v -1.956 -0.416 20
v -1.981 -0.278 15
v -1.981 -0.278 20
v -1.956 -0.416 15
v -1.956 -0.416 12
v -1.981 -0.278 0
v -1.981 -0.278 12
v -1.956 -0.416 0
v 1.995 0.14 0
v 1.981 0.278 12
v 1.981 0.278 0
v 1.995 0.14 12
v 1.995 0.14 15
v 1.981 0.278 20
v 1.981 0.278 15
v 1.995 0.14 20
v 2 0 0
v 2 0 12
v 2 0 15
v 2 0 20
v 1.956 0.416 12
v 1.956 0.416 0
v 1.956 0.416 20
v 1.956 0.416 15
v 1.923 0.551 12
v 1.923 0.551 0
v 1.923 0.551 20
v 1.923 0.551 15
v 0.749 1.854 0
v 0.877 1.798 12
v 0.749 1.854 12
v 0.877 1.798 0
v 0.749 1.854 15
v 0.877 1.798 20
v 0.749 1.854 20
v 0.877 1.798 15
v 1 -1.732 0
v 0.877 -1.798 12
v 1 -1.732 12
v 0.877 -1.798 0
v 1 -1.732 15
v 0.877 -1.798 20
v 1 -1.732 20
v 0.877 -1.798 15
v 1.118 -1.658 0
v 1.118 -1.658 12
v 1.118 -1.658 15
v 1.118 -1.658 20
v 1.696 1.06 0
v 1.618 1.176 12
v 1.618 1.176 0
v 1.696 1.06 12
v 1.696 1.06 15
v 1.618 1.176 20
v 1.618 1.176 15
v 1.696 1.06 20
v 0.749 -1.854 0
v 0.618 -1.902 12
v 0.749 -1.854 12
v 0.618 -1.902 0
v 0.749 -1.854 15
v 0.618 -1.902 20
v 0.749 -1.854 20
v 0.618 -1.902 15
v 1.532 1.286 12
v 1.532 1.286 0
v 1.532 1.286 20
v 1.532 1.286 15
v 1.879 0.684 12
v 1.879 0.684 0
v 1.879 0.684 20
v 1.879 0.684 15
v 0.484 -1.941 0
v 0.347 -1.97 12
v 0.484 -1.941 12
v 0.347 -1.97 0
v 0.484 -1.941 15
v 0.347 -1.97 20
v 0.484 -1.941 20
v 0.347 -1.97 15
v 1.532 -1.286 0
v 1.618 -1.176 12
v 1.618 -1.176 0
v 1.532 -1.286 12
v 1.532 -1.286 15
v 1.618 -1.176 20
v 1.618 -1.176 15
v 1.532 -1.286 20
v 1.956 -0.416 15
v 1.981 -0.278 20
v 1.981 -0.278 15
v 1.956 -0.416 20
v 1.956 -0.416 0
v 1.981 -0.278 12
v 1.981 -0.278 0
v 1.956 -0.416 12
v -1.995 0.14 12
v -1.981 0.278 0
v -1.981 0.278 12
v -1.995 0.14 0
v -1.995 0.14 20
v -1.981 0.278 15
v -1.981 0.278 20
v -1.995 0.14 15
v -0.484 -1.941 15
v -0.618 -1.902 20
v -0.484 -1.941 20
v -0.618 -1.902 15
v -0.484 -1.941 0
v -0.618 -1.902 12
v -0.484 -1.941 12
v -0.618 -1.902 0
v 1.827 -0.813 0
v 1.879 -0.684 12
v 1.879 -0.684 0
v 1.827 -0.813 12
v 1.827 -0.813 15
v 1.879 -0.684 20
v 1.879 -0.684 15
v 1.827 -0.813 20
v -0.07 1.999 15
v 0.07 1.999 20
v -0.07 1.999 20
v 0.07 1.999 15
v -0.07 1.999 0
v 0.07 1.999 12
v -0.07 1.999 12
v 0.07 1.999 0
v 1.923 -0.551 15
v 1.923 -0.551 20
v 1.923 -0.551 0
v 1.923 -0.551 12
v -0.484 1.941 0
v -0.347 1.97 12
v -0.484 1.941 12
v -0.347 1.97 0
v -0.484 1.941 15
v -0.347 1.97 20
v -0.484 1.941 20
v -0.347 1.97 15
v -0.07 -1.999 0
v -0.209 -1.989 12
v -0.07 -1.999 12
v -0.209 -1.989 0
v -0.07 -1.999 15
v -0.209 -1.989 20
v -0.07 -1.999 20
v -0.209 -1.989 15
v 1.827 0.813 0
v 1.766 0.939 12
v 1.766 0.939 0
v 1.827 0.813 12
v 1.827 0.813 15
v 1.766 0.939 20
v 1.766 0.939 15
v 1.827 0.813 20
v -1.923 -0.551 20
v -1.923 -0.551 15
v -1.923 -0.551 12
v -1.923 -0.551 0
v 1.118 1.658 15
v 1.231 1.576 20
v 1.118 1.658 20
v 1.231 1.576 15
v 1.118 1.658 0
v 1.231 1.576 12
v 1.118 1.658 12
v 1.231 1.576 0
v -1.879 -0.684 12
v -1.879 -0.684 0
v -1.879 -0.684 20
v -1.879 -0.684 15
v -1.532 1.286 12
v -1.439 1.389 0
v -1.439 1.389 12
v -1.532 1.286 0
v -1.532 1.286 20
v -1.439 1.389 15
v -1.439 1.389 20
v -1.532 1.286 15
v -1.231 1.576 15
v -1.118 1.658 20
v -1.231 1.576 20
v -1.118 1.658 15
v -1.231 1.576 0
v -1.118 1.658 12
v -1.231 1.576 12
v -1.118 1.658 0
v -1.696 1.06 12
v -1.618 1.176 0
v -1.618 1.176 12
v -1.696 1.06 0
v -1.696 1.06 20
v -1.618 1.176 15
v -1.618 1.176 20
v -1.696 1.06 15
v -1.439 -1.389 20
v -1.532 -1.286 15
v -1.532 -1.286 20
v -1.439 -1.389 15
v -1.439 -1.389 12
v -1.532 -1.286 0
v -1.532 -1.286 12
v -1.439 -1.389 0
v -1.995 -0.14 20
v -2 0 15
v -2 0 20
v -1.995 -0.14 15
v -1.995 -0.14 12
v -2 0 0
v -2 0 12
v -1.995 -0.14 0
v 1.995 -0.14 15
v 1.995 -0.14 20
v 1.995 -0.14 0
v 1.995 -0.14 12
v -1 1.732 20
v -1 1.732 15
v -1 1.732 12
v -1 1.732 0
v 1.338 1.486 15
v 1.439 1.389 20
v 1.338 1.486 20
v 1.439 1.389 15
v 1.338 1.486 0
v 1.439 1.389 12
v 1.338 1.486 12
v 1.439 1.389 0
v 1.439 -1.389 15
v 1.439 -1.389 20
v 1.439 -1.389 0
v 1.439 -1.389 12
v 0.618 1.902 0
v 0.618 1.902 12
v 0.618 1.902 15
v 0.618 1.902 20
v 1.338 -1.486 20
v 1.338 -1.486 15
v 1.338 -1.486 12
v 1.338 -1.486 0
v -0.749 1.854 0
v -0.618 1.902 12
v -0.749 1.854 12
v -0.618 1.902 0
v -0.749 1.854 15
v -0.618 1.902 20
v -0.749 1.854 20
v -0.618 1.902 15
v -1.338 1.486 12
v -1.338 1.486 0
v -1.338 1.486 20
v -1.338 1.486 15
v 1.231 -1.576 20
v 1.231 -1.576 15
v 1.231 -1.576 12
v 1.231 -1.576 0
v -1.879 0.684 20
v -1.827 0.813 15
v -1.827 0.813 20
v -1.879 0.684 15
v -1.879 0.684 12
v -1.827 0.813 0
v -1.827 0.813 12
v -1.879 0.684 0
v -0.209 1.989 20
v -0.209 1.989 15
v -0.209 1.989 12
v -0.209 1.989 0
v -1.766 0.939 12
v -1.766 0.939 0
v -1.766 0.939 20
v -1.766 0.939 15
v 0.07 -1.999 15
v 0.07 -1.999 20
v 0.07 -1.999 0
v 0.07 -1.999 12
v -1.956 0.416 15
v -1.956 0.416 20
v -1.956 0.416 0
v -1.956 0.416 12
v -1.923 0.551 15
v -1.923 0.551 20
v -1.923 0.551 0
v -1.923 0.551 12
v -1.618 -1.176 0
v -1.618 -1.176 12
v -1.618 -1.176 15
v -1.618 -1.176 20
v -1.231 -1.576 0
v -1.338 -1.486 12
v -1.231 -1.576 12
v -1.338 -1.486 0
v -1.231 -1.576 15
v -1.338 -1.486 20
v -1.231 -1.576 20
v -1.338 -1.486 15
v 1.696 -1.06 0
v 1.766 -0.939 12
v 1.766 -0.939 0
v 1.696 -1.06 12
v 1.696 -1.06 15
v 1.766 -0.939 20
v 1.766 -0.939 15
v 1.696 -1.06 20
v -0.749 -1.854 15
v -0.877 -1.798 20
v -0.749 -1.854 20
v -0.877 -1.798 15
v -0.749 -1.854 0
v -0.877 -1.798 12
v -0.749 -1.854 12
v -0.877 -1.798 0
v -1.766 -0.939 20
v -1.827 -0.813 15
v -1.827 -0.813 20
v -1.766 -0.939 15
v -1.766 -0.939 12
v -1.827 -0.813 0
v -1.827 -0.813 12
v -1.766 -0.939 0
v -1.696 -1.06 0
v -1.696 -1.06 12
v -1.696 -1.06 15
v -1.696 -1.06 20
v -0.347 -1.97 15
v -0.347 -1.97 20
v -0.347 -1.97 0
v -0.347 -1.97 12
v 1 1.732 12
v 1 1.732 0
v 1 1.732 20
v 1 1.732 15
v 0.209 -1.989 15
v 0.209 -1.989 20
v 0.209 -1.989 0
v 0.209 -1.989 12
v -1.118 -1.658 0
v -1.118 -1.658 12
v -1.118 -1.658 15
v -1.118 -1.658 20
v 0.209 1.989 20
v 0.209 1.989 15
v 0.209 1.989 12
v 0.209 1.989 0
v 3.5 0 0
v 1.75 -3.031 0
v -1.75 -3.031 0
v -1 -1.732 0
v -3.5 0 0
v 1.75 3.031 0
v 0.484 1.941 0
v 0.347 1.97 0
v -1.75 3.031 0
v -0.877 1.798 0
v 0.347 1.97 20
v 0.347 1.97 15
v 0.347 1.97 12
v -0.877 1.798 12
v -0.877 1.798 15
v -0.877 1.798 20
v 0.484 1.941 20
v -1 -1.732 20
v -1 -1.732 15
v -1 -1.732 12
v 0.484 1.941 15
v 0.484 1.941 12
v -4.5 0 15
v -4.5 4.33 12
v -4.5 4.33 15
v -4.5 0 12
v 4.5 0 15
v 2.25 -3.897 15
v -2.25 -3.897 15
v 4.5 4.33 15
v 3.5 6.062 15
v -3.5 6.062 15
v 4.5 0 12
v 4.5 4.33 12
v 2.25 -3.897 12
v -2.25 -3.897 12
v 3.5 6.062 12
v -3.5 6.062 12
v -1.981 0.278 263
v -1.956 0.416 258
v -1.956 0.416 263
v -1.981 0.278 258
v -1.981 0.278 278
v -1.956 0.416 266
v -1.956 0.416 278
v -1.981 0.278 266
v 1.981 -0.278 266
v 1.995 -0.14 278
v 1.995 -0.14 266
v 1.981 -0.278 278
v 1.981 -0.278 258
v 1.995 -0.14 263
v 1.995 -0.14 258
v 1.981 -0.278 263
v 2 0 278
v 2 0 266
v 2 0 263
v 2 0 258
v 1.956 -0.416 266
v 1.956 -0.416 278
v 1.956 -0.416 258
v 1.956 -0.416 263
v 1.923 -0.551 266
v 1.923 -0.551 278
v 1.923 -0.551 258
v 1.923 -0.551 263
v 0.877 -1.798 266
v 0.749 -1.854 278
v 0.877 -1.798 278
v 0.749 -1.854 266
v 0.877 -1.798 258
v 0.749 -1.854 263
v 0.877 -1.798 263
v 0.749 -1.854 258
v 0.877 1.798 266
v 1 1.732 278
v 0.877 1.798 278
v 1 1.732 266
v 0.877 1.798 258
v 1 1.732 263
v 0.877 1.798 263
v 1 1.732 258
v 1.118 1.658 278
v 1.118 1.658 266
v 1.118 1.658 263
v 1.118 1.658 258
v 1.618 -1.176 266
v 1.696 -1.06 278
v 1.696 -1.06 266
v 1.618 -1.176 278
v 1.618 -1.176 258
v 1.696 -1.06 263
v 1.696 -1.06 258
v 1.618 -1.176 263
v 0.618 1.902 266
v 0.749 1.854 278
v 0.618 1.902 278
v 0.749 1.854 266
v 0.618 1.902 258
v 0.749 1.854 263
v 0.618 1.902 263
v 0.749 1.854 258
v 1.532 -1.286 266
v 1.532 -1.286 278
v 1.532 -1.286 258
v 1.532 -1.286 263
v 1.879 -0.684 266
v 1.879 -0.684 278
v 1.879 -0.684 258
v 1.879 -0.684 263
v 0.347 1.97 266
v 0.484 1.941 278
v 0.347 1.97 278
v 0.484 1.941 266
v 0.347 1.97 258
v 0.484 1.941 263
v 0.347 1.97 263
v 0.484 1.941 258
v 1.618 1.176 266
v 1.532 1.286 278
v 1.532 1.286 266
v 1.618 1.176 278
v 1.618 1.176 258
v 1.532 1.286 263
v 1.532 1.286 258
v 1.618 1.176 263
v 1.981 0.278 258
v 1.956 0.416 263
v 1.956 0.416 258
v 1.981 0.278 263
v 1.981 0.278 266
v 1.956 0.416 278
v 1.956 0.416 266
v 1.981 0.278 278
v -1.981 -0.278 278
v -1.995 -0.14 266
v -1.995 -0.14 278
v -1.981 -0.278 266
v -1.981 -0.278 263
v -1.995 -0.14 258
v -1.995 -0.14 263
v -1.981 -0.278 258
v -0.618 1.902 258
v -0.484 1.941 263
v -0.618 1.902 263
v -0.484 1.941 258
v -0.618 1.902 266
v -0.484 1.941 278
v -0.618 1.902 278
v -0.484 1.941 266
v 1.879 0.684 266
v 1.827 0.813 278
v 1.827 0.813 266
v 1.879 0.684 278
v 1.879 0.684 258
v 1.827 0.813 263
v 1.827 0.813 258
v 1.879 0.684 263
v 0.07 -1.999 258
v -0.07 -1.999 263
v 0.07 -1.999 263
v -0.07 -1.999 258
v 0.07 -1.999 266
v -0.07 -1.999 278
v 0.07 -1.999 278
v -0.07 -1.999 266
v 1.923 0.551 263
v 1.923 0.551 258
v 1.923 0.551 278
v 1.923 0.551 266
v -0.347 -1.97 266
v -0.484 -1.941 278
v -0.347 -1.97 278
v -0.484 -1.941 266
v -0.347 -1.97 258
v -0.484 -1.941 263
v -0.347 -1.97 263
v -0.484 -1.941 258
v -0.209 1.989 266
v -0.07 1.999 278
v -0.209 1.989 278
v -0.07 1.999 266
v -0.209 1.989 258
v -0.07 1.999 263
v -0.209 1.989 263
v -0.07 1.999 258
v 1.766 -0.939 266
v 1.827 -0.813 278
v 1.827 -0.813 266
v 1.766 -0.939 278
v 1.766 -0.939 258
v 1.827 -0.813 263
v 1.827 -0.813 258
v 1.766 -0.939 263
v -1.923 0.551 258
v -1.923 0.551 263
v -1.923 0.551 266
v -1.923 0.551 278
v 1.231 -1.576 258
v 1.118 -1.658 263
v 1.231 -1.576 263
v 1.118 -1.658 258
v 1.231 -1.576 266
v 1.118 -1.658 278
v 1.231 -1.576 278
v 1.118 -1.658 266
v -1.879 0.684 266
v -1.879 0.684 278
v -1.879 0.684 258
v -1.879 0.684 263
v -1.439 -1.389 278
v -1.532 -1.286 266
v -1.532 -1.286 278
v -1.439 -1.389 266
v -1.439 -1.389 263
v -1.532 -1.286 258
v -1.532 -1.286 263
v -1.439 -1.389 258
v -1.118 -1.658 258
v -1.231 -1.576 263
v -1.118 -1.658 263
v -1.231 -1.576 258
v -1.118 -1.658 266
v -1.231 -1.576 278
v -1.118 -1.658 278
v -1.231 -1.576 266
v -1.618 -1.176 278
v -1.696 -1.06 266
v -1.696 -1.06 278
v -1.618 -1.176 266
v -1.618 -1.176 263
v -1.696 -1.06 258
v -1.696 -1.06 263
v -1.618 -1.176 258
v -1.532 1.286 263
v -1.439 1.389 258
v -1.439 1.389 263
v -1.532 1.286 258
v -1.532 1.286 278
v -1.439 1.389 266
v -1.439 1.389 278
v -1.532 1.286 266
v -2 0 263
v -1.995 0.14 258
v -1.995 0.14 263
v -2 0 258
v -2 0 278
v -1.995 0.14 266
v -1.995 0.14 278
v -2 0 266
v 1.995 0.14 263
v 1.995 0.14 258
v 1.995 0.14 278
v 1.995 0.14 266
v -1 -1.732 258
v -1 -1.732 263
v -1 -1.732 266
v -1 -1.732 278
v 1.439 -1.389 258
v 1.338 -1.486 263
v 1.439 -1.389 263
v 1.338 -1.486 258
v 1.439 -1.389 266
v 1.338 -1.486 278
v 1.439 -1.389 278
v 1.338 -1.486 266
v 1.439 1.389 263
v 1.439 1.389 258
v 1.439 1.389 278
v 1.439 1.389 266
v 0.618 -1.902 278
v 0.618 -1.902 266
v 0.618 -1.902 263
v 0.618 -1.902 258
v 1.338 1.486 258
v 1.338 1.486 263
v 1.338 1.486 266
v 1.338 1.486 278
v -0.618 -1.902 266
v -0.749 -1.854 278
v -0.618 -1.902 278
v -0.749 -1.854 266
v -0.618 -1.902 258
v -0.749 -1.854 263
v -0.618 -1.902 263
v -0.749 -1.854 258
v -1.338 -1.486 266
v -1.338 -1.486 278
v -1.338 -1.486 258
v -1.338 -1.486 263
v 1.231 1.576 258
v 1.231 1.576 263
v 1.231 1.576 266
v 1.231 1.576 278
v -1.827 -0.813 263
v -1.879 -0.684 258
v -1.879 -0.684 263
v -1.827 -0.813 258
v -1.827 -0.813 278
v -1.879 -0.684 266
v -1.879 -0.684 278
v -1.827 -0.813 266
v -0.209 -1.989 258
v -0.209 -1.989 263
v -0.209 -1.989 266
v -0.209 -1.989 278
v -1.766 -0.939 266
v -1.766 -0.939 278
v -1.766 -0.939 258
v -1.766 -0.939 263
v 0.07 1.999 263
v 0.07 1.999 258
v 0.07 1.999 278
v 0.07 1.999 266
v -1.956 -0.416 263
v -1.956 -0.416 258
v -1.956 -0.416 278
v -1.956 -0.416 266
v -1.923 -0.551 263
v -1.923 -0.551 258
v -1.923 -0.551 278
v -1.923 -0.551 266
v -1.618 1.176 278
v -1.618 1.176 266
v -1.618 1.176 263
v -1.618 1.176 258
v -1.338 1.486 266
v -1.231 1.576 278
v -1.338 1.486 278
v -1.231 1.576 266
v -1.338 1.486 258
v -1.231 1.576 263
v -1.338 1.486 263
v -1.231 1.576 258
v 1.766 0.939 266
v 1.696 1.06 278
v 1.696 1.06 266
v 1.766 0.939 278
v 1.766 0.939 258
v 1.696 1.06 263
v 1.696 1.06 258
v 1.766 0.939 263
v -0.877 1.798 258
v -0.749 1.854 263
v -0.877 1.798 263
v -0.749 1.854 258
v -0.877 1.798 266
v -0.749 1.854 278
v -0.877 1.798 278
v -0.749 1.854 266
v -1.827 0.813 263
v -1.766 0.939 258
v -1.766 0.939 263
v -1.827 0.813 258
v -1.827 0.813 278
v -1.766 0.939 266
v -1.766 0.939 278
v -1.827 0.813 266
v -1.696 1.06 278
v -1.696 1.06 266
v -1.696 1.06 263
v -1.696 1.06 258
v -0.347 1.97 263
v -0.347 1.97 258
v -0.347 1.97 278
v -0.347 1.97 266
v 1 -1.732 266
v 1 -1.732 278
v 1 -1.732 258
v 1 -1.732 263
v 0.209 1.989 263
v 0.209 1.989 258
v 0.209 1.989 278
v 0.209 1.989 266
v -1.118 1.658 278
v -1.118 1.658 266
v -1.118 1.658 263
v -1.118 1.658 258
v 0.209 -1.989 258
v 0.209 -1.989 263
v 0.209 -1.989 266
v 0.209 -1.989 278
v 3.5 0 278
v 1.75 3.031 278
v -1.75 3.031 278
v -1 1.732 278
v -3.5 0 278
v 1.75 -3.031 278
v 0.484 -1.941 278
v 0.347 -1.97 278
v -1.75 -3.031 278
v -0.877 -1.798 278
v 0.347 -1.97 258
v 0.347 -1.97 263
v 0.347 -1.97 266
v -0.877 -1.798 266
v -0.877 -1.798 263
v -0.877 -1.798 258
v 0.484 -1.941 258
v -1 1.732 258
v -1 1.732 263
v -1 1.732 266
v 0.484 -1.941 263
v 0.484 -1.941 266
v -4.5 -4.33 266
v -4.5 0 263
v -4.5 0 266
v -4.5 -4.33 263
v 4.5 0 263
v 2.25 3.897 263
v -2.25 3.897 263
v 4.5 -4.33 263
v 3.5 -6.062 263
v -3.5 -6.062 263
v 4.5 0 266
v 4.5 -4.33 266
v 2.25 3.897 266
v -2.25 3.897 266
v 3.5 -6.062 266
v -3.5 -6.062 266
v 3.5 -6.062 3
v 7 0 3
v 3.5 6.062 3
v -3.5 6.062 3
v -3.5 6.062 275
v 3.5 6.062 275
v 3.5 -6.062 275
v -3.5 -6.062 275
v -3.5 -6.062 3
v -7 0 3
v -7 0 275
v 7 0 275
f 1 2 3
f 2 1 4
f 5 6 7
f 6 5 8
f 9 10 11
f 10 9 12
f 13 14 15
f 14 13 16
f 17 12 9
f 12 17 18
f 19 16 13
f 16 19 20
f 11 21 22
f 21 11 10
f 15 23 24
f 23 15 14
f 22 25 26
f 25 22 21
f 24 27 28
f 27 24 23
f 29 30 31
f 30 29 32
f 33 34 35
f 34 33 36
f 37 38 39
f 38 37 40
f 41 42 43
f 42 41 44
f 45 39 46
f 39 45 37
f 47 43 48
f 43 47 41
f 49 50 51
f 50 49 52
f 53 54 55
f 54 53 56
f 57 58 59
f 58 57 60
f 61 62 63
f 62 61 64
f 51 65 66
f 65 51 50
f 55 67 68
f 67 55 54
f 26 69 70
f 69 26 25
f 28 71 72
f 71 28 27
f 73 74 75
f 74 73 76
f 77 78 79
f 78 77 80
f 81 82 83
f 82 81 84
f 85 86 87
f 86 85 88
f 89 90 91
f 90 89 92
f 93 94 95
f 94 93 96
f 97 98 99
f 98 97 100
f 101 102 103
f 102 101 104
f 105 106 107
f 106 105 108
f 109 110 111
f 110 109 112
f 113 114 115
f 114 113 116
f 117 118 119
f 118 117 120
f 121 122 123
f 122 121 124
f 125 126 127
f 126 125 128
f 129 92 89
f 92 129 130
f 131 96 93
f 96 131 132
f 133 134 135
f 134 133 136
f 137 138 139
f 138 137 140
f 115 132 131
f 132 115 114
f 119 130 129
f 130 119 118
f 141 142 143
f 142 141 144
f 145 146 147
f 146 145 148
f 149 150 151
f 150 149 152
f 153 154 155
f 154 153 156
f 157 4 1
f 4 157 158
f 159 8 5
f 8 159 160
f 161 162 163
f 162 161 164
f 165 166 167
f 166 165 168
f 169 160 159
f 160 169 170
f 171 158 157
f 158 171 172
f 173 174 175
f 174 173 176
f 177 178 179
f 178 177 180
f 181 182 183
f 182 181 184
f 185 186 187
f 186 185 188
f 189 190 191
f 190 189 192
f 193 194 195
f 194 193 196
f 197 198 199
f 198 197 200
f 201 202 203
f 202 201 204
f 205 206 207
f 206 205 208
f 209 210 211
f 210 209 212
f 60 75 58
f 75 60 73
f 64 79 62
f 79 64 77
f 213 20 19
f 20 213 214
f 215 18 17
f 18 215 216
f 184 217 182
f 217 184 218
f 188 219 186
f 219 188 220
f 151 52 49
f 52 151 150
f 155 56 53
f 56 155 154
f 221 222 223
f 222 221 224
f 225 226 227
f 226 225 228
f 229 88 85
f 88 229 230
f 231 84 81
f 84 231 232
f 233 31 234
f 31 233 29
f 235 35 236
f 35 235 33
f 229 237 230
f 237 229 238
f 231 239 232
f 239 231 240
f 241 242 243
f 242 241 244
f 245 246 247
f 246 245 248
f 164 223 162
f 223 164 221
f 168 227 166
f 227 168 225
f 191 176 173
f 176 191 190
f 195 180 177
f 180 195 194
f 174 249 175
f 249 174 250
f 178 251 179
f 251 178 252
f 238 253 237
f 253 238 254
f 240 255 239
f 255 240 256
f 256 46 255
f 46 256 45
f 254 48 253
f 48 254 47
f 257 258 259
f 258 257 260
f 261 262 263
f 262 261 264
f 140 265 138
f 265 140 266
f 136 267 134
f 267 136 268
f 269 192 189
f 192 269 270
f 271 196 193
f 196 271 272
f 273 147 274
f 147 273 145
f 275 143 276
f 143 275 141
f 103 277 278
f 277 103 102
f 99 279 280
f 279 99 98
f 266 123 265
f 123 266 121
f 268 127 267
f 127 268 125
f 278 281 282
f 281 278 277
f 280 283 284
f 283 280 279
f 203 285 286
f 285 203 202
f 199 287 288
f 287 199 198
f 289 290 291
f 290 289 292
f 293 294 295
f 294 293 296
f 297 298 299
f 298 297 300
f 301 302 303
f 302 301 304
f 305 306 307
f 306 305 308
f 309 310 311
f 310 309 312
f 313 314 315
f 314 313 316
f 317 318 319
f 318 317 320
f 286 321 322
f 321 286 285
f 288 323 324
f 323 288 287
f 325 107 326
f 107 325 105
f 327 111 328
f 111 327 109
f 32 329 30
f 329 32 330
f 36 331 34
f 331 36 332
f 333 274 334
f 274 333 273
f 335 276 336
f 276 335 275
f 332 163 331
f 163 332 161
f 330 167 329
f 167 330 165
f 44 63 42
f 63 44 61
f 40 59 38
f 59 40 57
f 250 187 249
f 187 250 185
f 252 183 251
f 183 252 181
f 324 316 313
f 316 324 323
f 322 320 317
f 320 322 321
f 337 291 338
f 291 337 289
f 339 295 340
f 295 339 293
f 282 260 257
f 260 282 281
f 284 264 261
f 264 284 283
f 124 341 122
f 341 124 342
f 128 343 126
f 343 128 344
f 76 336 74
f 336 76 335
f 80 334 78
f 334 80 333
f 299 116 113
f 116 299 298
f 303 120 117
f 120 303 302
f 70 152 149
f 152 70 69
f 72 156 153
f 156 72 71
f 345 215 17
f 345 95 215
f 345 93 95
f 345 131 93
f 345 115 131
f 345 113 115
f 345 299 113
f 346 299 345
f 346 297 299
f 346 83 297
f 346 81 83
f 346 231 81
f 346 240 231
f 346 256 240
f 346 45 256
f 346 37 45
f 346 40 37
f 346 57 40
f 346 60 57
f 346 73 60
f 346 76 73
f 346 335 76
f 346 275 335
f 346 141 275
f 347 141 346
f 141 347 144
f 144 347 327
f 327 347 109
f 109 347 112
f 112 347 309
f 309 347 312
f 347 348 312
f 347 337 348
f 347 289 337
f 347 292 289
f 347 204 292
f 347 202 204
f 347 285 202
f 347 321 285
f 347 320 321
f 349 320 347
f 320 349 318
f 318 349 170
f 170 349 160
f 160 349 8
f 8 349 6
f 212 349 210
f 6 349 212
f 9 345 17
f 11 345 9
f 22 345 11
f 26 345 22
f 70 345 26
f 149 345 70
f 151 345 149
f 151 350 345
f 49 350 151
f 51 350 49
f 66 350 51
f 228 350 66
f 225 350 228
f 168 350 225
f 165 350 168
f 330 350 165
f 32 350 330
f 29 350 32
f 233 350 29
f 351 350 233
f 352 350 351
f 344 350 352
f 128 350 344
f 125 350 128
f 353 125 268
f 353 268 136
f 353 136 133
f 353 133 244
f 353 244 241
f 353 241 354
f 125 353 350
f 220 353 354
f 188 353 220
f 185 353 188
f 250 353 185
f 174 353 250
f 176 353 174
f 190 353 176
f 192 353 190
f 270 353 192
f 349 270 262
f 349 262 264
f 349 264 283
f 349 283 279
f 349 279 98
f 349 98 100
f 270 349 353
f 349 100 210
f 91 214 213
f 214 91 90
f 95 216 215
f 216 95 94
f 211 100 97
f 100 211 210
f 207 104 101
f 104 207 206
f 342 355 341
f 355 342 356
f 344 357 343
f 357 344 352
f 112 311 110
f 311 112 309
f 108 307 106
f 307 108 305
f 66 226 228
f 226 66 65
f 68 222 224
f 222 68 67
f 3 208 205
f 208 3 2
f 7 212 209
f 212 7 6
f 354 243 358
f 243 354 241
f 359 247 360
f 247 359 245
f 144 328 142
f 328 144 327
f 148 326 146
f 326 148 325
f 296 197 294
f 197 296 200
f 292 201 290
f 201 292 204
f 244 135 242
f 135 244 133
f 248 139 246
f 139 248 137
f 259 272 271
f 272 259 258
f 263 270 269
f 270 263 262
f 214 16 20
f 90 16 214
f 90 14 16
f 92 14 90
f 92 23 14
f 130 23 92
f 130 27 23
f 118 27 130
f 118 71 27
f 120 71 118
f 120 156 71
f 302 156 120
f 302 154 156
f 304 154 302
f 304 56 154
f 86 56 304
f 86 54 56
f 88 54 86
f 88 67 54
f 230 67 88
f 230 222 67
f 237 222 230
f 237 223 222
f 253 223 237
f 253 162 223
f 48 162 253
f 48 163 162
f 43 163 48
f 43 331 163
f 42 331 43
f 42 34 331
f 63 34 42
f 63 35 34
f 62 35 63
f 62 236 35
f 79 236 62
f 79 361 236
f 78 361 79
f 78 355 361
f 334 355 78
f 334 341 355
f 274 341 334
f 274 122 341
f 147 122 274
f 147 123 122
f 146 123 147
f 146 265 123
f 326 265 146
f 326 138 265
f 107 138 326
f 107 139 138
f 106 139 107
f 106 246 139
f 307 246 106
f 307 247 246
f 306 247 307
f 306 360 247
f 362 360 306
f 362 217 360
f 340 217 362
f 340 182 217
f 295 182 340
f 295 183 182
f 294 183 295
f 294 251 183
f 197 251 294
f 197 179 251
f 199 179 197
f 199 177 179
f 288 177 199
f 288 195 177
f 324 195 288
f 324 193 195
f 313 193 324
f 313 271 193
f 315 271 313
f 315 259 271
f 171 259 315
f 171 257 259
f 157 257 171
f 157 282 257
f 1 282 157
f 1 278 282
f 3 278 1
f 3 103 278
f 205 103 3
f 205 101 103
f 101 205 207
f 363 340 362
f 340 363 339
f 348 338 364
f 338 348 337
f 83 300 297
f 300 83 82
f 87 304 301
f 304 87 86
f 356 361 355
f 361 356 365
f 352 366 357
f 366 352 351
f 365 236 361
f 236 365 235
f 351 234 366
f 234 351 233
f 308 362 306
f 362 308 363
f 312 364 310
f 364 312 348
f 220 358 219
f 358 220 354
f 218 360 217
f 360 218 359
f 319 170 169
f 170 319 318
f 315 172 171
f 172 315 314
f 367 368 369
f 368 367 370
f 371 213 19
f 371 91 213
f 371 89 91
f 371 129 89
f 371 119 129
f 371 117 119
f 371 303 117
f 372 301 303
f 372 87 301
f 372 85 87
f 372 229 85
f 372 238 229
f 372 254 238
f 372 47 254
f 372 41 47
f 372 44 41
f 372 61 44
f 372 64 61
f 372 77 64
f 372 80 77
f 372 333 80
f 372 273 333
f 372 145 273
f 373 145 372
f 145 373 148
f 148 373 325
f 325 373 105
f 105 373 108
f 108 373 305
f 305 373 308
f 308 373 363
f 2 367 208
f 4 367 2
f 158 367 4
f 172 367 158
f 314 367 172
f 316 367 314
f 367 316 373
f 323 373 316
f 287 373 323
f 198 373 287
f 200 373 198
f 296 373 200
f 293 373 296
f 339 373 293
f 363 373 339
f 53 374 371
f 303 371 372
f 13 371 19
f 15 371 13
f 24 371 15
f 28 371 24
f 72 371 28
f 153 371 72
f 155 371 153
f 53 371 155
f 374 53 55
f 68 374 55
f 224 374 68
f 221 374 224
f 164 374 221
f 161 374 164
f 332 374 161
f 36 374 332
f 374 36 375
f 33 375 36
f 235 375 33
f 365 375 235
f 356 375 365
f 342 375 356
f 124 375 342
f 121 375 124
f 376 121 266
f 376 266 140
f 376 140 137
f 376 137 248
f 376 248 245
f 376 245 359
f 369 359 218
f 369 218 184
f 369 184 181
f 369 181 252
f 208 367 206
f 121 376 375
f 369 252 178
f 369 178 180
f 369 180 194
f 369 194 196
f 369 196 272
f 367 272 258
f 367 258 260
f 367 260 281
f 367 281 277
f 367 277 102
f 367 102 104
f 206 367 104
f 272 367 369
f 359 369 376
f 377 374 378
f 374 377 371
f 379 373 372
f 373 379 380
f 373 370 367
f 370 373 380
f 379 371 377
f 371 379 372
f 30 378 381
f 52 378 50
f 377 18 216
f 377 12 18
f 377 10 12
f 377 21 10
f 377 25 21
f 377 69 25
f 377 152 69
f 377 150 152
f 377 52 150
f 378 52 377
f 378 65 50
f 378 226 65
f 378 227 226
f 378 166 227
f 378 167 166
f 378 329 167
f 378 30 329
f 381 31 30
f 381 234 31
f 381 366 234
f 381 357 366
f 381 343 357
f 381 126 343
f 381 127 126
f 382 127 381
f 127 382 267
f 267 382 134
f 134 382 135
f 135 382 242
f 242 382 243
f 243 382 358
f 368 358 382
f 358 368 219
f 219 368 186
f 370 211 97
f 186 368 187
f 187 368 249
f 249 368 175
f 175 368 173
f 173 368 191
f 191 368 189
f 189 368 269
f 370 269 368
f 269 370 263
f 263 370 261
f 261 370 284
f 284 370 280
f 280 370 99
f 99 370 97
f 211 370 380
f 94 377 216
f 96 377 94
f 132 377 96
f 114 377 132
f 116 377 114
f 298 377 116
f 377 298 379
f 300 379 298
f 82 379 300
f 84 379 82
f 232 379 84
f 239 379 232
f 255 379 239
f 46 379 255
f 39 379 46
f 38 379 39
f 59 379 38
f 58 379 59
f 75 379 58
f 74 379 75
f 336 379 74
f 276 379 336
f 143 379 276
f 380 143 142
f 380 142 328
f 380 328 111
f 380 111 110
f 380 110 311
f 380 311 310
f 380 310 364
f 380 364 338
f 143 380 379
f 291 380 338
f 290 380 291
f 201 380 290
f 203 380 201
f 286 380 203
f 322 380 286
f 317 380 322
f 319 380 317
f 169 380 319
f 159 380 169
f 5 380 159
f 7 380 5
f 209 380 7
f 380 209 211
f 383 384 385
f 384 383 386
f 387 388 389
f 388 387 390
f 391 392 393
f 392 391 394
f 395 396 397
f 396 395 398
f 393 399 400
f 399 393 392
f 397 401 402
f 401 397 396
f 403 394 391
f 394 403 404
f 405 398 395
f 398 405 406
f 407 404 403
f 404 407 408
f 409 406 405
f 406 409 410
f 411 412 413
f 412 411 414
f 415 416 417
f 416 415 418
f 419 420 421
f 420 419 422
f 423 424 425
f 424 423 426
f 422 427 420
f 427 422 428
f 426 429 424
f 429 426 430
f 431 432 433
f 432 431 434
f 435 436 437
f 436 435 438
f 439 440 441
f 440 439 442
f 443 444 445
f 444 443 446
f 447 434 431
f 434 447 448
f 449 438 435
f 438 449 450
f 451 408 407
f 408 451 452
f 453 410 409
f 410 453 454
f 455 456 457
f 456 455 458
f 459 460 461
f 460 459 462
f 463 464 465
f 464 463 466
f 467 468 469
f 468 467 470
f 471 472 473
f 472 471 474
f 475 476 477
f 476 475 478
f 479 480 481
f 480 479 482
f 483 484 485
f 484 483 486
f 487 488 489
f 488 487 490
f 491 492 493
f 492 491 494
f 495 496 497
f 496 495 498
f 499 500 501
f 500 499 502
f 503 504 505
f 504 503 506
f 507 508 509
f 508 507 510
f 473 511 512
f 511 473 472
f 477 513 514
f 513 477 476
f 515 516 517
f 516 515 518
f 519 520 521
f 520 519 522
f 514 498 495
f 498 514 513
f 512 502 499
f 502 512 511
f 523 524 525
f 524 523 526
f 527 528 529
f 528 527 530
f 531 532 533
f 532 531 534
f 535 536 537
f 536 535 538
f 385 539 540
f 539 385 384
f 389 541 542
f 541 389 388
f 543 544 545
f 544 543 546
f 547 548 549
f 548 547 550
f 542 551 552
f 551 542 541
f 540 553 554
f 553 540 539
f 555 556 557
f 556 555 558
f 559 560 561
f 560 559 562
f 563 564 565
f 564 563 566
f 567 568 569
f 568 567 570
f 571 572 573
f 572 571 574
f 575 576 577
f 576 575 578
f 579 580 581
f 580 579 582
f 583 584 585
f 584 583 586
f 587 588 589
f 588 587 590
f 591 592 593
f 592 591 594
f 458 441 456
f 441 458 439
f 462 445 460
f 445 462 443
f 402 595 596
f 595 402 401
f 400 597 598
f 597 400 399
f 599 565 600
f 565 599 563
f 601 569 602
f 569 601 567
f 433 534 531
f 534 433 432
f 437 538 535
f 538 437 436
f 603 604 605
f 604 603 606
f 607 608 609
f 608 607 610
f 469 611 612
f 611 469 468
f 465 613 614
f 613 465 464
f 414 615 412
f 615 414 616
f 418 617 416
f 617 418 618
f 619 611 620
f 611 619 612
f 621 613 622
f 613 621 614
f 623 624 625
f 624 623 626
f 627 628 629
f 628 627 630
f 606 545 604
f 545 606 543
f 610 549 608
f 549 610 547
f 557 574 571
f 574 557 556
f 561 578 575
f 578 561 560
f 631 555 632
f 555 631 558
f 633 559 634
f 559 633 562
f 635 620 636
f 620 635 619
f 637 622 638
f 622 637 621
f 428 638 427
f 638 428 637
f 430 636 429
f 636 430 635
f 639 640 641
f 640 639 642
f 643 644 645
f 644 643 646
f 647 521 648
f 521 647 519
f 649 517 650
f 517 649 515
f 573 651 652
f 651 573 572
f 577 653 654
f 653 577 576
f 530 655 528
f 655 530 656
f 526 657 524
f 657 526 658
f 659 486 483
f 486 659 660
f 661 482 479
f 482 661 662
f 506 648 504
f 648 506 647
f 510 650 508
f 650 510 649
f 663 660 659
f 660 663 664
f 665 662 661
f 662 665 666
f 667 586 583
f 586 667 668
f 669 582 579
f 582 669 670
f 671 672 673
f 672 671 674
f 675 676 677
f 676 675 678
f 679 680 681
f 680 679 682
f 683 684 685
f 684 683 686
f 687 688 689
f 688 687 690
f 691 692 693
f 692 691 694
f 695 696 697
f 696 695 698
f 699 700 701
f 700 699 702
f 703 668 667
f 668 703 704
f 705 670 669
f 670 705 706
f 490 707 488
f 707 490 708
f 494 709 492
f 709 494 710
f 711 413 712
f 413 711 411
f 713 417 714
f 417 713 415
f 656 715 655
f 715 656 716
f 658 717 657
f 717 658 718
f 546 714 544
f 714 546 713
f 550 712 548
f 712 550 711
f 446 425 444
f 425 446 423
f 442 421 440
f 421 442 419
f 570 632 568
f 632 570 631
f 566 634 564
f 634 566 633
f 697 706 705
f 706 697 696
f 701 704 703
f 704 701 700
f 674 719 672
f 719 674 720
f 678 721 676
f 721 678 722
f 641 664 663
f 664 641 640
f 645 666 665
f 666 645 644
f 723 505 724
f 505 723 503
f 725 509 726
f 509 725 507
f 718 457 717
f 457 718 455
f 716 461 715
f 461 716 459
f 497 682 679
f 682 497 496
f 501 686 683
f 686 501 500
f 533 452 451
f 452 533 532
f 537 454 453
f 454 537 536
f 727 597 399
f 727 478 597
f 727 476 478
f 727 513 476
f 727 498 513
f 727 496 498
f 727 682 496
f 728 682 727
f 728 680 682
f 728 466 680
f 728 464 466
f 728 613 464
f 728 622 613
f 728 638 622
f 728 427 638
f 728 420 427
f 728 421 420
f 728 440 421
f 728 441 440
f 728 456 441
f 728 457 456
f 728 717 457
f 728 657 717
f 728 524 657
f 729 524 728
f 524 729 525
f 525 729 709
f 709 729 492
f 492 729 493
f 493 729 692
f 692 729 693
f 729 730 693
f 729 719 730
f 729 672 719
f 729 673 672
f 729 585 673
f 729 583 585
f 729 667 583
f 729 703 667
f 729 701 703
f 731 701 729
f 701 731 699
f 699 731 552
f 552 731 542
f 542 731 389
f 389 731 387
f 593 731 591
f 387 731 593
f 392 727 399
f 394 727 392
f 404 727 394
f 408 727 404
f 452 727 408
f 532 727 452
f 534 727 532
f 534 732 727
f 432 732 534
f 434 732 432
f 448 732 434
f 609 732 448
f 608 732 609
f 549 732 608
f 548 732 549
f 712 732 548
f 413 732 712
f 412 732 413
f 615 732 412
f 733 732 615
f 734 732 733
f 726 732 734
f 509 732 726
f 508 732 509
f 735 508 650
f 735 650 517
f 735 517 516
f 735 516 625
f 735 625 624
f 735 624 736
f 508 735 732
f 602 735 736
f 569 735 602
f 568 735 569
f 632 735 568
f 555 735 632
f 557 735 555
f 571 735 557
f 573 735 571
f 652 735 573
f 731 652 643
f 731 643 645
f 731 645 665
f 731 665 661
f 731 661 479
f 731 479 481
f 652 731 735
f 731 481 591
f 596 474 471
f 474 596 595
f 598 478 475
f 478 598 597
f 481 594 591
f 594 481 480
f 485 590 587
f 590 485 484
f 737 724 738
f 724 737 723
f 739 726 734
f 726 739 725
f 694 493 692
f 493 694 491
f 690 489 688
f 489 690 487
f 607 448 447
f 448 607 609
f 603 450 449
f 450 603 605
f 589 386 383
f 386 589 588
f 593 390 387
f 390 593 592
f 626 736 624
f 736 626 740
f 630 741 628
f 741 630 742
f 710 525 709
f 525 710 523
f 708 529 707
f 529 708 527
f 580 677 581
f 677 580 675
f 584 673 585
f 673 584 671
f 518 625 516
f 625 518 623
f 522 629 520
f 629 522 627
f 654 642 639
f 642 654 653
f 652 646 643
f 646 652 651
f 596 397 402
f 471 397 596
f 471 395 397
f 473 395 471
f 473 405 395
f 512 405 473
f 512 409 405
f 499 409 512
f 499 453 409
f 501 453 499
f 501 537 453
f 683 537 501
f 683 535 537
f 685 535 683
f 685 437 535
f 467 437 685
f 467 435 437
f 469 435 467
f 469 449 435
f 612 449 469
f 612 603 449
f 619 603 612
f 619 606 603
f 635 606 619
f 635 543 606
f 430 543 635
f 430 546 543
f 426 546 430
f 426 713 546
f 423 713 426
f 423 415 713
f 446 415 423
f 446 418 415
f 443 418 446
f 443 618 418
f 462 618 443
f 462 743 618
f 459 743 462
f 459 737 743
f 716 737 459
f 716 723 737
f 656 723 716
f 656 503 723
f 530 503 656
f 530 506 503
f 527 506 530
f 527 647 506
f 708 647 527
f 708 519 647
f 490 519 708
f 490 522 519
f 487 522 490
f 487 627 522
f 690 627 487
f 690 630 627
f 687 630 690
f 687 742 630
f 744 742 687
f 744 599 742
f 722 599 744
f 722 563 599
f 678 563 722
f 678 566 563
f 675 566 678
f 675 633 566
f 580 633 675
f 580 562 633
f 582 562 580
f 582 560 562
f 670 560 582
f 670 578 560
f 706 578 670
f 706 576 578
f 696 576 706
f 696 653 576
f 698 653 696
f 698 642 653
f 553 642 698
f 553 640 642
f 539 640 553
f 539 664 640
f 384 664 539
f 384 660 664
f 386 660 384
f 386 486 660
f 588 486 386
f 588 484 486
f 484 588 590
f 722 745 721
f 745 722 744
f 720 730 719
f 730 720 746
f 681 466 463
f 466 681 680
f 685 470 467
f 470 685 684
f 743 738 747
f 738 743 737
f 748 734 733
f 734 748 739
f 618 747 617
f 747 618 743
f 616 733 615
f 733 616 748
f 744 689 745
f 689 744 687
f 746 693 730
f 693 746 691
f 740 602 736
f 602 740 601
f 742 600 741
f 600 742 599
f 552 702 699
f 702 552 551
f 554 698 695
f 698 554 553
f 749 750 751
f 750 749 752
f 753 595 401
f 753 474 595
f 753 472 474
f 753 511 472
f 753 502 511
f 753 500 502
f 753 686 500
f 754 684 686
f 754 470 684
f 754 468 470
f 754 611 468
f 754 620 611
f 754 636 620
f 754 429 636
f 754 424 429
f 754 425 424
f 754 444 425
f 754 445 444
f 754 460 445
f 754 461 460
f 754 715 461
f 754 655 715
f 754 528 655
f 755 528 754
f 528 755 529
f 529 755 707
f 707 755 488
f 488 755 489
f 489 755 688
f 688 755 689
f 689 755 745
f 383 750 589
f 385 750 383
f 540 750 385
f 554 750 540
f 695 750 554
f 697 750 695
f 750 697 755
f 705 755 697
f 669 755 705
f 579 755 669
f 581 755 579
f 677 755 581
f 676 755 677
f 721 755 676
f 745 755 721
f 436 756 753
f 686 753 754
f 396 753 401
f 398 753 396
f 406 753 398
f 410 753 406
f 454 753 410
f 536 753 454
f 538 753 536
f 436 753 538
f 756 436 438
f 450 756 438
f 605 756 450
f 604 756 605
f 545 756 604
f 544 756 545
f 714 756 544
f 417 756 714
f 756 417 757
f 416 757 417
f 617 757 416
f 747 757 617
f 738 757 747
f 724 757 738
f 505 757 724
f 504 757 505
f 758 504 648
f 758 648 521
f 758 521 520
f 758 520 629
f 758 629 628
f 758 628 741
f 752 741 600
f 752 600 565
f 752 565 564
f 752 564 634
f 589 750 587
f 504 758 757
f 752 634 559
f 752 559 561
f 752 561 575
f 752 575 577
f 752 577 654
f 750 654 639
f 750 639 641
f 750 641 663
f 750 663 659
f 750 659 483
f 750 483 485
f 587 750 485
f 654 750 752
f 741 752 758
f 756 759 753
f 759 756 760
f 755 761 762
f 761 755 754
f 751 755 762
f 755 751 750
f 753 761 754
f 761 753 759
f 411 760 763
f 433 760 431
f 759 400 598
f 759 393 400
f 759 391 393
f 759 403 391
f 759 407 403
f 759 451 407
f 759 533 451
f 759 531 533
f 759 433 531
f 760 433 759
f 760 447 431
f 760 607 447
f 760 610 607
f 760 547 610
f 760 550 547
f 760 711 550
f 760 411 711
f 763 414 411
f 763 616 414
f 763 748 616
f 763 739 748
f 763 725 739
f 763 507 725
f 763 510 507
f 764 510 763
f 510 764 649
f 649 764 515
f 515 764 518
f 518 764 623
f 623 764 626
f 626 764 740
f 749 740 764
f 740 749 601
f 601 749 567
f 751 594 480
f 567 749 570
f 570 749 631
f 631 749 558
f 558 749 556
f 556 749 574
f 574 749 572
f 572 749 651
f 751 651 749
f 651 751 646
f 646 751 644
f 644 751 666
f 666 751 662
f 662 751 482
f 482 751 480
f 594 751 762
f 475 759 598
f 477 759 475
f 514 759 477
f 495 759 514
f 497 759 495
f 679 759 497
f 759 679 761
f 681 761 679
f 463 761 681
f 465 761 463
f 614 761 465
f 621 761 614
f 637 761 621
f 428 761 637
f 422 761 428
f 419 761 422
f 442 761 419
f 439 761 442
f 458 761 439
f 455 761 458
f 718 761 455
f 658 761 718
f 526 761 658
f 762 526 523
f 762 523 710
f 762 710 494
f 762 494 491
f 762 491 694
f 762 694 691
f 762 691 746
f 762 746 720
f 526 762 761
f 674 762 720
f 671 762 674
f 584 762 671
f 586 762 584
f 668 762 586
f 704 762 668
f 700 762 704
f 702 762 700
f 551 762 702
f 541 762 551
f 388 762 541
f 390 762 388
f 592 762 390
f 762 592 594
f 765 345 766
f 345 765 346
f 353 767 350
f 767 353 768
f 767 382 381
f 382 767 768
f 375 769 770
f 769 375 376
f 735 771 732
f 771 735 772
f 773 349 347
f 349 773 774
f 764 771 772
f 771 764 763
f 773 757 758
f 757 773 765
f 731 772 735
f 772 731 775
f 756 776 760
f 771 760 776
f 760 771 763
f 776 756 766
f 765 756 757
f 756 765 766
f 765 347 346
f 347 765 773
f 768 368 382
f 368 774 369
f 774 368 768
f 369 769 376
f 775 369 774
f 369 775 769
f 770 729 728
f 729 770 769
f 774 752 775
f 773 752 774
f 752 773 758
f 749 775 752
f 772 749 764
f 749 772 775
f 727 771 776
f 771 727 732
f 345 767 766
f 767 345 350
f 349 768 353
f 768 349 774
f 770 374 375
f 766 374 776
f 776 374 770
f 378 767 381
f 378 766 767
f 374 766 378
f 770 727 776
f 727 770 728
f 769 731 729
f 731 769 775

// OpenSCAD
// Threaded ball diameter in mm
ballDiameter = 10; // [8, 10, 12]

// Thickness of the push rod
rodDiameter = 14; // [5:20]

// Total intended push rod length (center to center between ball joints) 
pushRodLength = 288; // [50:400]

// Width of the grub screw
grubScrewDiameter = 4; // [3,4,5]

// Maximum length of the grub screw
grubScrewLength = 20; // [5:50]

// Nut trap distance from rod end
nutTrapOffset = 12; // [4:30]

// Width of the nut trap
nutTrapWidth = 9; 

// Height of the nut trap
nutTrapHeight = 3; 

/* [Hidden] */
lipWidth = 1;
taperLength = 3;
rodSideCount = 6;
nutSideCount = 6;


difference() {
    hull() {
        cylinder(r=lipWidth + ballDiameter/4, h=pushRodLength-ballDiameter, $fn=rodSideCount);  
        translate([0,0,taperLength])
            cylinder(r=rodDiameter/2, h=pushRodLength-ballDiameter-2*taperLength, $fn=rodSideCount);    
    };
    for (i = [[0,0],[pushRodLength-ballDiameter,180]]) {
        translate([0,0,i[0]]) rotate([i[1],0,0]) {
            cylinder(r=grubScrewDiameter/2, h=grubScrewLength, $fn=90);
            translate([0,0,nutTrapOffset])  
                hull() {
                    cylinder(r=nutTrapWidth/2, h=nutTrapHeight, $fn=nutSideCount);
                    translate([0,rodDiameter/2,0]) 
                        cylinder(r=nutTrapWidth/2, h=nutTrapHeight, $fn=nutSideCount);
                };
        }
    };
}
